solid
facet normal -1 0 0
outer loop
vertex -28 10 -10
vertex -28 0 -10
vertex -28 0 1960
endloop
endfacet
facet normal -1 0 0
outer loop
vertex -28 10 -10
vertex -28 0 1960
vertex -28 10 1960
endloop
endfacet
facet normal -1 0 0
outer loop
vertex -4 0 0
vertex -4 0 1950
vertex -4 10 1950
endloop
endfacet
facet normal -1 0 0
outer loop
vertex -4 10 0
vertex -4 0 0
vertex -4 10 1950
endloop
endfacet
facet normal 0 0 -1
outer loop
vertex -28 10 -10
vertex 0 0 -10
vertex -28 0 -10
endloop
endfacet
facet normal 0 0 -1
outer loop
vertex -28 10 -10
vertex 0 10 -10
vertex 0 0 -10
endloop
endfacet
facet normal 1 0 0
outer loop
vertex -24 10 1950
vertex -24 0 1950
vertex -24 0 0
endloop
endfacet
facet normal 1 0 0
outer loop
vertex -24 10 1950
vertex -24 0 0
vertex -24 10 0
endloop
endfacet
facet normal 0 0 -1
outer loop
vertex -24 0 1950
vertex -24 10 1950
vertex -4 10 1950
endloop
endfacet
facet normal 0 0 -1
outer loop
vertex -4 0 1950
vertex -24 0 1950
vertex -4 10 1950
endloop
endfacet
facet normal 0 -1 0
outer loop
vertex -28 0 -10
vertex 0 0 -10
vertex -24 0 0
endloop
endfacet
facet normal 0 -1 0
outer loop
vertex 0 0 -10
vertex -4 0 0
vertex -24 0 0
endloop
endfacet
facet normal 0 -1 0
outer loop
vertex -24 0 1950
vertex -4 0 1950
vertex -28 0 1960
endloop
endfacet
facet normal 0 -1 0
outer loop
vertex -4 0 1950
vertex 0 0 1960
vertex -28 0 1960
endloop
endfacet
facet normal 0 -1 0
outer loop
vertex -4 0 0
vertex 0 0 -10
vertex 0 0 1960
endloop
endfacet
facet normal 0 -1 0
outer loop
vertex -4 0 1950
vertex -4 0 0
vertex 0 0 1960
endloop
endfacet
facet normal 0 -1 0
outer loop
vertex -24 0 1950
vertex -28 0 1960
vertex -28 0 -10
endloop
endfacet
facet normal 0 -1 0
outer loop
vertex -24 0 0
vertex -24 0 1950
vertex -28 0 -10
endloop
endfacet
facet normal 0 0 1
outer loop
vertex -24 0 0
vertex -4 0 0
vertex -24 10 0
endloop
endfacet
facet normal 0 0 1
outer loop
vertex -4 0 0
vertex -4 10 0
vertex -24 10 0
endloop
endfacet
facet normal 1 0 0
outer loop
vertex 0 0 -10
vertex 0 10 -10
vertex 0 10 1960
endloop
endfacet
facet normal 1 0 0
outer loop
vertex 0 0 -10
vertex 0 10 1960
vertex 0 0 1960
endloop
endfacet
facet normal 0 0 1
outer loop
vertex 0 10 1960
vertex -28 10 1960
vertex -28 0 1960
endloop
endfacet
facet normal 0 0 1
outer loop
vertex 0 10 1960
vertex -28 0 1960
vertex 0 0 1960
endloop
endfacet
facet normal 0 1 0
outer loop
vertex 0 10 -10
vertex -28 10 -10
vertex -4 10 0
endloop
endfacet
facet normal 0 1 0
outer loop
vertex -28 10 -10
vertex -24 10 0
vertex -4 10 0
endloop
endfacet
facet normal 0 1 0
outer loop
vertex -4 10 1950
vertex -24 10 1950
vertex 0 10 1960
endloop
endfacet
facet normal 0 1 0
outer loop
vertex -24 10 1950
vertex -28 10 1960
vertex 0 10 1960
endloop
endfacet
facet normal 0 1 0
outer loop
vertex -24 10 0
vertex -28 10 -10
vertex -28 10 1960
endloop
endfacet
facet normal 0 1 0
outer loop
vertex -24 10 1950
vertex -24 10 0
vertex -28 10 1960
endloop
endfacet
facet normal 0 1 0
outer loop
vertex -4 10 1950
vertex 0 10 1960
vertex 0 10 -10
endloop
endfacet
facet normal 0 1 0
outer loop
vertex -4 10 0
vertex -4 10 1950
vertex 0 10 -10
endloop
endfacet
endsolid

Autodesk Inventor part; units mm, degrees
ref_plane "YZ Plane" through (0, 0, 0) normal (1, 0, 0) x (0, 1, 0)
ref_plane "XZ Plane" through (0, 0, 0) normal (0, 1, 0) x (-1, 0, 0)
ref_plane "XY Plane" through (0, 0, 0) normal (0, 0, 1) x (1, 0, 0)
sketch "Sketch1" plane through (0, 0, 0) normal (0, 0, 1) x (1, 0, 0)
  line L0 (0, 0) -> (-4, 0)
  line L1 (-4, 0) -> (-4, 10)
  line L2 (-4, 10) -> (0, 10)
  line L3 (0, 10) -> (0, 0)
  line L4 (-28, 0) -> (-24, 0)
  line L5 (-24, 0) -> (-24, 10)
  line L6 (-24, 10) -> (-28, 10)
  line L7 (-28, 10) -> (-28, 0)
  dimension "d0" = 4
  dimension "d1" = 10
extrude "Extrusion1" add sketch "Sketch1" along normal blind 1950
sketch "Sketch2" plane through (0, 0, 1950) normal (0, 0, 1) x (1, 0, 0)
  line L0 (-24, 10) -> (-28, 10) projected
  line L1 (-28, 10) -> (0, 10)
  line L2 (0, 10) -> (0, 0)
  line L3 (0, 0) -> (-28, 0)
  line L4 (-28, 0) -> (-28, 10)
extrude "Extrusion2" add sketch "Sketch2" along normal blind 10
sketch "Sketch3" plane through (0, 0, 0) normal (0, 0, -1) x (-1, 0, 0)
  line L0 (0, 0) -> (4, 0) projected
  line L1 (0, 0) -> (28, 0)
  line L2 (28, 0) -> (28, 10)
  line L3 (28, 10) -> (0, 10)
  line L4 (0, 10) -> (0, 0)
extrude "Extrusion3" add sketch "Sketch3" along normal blind 10
